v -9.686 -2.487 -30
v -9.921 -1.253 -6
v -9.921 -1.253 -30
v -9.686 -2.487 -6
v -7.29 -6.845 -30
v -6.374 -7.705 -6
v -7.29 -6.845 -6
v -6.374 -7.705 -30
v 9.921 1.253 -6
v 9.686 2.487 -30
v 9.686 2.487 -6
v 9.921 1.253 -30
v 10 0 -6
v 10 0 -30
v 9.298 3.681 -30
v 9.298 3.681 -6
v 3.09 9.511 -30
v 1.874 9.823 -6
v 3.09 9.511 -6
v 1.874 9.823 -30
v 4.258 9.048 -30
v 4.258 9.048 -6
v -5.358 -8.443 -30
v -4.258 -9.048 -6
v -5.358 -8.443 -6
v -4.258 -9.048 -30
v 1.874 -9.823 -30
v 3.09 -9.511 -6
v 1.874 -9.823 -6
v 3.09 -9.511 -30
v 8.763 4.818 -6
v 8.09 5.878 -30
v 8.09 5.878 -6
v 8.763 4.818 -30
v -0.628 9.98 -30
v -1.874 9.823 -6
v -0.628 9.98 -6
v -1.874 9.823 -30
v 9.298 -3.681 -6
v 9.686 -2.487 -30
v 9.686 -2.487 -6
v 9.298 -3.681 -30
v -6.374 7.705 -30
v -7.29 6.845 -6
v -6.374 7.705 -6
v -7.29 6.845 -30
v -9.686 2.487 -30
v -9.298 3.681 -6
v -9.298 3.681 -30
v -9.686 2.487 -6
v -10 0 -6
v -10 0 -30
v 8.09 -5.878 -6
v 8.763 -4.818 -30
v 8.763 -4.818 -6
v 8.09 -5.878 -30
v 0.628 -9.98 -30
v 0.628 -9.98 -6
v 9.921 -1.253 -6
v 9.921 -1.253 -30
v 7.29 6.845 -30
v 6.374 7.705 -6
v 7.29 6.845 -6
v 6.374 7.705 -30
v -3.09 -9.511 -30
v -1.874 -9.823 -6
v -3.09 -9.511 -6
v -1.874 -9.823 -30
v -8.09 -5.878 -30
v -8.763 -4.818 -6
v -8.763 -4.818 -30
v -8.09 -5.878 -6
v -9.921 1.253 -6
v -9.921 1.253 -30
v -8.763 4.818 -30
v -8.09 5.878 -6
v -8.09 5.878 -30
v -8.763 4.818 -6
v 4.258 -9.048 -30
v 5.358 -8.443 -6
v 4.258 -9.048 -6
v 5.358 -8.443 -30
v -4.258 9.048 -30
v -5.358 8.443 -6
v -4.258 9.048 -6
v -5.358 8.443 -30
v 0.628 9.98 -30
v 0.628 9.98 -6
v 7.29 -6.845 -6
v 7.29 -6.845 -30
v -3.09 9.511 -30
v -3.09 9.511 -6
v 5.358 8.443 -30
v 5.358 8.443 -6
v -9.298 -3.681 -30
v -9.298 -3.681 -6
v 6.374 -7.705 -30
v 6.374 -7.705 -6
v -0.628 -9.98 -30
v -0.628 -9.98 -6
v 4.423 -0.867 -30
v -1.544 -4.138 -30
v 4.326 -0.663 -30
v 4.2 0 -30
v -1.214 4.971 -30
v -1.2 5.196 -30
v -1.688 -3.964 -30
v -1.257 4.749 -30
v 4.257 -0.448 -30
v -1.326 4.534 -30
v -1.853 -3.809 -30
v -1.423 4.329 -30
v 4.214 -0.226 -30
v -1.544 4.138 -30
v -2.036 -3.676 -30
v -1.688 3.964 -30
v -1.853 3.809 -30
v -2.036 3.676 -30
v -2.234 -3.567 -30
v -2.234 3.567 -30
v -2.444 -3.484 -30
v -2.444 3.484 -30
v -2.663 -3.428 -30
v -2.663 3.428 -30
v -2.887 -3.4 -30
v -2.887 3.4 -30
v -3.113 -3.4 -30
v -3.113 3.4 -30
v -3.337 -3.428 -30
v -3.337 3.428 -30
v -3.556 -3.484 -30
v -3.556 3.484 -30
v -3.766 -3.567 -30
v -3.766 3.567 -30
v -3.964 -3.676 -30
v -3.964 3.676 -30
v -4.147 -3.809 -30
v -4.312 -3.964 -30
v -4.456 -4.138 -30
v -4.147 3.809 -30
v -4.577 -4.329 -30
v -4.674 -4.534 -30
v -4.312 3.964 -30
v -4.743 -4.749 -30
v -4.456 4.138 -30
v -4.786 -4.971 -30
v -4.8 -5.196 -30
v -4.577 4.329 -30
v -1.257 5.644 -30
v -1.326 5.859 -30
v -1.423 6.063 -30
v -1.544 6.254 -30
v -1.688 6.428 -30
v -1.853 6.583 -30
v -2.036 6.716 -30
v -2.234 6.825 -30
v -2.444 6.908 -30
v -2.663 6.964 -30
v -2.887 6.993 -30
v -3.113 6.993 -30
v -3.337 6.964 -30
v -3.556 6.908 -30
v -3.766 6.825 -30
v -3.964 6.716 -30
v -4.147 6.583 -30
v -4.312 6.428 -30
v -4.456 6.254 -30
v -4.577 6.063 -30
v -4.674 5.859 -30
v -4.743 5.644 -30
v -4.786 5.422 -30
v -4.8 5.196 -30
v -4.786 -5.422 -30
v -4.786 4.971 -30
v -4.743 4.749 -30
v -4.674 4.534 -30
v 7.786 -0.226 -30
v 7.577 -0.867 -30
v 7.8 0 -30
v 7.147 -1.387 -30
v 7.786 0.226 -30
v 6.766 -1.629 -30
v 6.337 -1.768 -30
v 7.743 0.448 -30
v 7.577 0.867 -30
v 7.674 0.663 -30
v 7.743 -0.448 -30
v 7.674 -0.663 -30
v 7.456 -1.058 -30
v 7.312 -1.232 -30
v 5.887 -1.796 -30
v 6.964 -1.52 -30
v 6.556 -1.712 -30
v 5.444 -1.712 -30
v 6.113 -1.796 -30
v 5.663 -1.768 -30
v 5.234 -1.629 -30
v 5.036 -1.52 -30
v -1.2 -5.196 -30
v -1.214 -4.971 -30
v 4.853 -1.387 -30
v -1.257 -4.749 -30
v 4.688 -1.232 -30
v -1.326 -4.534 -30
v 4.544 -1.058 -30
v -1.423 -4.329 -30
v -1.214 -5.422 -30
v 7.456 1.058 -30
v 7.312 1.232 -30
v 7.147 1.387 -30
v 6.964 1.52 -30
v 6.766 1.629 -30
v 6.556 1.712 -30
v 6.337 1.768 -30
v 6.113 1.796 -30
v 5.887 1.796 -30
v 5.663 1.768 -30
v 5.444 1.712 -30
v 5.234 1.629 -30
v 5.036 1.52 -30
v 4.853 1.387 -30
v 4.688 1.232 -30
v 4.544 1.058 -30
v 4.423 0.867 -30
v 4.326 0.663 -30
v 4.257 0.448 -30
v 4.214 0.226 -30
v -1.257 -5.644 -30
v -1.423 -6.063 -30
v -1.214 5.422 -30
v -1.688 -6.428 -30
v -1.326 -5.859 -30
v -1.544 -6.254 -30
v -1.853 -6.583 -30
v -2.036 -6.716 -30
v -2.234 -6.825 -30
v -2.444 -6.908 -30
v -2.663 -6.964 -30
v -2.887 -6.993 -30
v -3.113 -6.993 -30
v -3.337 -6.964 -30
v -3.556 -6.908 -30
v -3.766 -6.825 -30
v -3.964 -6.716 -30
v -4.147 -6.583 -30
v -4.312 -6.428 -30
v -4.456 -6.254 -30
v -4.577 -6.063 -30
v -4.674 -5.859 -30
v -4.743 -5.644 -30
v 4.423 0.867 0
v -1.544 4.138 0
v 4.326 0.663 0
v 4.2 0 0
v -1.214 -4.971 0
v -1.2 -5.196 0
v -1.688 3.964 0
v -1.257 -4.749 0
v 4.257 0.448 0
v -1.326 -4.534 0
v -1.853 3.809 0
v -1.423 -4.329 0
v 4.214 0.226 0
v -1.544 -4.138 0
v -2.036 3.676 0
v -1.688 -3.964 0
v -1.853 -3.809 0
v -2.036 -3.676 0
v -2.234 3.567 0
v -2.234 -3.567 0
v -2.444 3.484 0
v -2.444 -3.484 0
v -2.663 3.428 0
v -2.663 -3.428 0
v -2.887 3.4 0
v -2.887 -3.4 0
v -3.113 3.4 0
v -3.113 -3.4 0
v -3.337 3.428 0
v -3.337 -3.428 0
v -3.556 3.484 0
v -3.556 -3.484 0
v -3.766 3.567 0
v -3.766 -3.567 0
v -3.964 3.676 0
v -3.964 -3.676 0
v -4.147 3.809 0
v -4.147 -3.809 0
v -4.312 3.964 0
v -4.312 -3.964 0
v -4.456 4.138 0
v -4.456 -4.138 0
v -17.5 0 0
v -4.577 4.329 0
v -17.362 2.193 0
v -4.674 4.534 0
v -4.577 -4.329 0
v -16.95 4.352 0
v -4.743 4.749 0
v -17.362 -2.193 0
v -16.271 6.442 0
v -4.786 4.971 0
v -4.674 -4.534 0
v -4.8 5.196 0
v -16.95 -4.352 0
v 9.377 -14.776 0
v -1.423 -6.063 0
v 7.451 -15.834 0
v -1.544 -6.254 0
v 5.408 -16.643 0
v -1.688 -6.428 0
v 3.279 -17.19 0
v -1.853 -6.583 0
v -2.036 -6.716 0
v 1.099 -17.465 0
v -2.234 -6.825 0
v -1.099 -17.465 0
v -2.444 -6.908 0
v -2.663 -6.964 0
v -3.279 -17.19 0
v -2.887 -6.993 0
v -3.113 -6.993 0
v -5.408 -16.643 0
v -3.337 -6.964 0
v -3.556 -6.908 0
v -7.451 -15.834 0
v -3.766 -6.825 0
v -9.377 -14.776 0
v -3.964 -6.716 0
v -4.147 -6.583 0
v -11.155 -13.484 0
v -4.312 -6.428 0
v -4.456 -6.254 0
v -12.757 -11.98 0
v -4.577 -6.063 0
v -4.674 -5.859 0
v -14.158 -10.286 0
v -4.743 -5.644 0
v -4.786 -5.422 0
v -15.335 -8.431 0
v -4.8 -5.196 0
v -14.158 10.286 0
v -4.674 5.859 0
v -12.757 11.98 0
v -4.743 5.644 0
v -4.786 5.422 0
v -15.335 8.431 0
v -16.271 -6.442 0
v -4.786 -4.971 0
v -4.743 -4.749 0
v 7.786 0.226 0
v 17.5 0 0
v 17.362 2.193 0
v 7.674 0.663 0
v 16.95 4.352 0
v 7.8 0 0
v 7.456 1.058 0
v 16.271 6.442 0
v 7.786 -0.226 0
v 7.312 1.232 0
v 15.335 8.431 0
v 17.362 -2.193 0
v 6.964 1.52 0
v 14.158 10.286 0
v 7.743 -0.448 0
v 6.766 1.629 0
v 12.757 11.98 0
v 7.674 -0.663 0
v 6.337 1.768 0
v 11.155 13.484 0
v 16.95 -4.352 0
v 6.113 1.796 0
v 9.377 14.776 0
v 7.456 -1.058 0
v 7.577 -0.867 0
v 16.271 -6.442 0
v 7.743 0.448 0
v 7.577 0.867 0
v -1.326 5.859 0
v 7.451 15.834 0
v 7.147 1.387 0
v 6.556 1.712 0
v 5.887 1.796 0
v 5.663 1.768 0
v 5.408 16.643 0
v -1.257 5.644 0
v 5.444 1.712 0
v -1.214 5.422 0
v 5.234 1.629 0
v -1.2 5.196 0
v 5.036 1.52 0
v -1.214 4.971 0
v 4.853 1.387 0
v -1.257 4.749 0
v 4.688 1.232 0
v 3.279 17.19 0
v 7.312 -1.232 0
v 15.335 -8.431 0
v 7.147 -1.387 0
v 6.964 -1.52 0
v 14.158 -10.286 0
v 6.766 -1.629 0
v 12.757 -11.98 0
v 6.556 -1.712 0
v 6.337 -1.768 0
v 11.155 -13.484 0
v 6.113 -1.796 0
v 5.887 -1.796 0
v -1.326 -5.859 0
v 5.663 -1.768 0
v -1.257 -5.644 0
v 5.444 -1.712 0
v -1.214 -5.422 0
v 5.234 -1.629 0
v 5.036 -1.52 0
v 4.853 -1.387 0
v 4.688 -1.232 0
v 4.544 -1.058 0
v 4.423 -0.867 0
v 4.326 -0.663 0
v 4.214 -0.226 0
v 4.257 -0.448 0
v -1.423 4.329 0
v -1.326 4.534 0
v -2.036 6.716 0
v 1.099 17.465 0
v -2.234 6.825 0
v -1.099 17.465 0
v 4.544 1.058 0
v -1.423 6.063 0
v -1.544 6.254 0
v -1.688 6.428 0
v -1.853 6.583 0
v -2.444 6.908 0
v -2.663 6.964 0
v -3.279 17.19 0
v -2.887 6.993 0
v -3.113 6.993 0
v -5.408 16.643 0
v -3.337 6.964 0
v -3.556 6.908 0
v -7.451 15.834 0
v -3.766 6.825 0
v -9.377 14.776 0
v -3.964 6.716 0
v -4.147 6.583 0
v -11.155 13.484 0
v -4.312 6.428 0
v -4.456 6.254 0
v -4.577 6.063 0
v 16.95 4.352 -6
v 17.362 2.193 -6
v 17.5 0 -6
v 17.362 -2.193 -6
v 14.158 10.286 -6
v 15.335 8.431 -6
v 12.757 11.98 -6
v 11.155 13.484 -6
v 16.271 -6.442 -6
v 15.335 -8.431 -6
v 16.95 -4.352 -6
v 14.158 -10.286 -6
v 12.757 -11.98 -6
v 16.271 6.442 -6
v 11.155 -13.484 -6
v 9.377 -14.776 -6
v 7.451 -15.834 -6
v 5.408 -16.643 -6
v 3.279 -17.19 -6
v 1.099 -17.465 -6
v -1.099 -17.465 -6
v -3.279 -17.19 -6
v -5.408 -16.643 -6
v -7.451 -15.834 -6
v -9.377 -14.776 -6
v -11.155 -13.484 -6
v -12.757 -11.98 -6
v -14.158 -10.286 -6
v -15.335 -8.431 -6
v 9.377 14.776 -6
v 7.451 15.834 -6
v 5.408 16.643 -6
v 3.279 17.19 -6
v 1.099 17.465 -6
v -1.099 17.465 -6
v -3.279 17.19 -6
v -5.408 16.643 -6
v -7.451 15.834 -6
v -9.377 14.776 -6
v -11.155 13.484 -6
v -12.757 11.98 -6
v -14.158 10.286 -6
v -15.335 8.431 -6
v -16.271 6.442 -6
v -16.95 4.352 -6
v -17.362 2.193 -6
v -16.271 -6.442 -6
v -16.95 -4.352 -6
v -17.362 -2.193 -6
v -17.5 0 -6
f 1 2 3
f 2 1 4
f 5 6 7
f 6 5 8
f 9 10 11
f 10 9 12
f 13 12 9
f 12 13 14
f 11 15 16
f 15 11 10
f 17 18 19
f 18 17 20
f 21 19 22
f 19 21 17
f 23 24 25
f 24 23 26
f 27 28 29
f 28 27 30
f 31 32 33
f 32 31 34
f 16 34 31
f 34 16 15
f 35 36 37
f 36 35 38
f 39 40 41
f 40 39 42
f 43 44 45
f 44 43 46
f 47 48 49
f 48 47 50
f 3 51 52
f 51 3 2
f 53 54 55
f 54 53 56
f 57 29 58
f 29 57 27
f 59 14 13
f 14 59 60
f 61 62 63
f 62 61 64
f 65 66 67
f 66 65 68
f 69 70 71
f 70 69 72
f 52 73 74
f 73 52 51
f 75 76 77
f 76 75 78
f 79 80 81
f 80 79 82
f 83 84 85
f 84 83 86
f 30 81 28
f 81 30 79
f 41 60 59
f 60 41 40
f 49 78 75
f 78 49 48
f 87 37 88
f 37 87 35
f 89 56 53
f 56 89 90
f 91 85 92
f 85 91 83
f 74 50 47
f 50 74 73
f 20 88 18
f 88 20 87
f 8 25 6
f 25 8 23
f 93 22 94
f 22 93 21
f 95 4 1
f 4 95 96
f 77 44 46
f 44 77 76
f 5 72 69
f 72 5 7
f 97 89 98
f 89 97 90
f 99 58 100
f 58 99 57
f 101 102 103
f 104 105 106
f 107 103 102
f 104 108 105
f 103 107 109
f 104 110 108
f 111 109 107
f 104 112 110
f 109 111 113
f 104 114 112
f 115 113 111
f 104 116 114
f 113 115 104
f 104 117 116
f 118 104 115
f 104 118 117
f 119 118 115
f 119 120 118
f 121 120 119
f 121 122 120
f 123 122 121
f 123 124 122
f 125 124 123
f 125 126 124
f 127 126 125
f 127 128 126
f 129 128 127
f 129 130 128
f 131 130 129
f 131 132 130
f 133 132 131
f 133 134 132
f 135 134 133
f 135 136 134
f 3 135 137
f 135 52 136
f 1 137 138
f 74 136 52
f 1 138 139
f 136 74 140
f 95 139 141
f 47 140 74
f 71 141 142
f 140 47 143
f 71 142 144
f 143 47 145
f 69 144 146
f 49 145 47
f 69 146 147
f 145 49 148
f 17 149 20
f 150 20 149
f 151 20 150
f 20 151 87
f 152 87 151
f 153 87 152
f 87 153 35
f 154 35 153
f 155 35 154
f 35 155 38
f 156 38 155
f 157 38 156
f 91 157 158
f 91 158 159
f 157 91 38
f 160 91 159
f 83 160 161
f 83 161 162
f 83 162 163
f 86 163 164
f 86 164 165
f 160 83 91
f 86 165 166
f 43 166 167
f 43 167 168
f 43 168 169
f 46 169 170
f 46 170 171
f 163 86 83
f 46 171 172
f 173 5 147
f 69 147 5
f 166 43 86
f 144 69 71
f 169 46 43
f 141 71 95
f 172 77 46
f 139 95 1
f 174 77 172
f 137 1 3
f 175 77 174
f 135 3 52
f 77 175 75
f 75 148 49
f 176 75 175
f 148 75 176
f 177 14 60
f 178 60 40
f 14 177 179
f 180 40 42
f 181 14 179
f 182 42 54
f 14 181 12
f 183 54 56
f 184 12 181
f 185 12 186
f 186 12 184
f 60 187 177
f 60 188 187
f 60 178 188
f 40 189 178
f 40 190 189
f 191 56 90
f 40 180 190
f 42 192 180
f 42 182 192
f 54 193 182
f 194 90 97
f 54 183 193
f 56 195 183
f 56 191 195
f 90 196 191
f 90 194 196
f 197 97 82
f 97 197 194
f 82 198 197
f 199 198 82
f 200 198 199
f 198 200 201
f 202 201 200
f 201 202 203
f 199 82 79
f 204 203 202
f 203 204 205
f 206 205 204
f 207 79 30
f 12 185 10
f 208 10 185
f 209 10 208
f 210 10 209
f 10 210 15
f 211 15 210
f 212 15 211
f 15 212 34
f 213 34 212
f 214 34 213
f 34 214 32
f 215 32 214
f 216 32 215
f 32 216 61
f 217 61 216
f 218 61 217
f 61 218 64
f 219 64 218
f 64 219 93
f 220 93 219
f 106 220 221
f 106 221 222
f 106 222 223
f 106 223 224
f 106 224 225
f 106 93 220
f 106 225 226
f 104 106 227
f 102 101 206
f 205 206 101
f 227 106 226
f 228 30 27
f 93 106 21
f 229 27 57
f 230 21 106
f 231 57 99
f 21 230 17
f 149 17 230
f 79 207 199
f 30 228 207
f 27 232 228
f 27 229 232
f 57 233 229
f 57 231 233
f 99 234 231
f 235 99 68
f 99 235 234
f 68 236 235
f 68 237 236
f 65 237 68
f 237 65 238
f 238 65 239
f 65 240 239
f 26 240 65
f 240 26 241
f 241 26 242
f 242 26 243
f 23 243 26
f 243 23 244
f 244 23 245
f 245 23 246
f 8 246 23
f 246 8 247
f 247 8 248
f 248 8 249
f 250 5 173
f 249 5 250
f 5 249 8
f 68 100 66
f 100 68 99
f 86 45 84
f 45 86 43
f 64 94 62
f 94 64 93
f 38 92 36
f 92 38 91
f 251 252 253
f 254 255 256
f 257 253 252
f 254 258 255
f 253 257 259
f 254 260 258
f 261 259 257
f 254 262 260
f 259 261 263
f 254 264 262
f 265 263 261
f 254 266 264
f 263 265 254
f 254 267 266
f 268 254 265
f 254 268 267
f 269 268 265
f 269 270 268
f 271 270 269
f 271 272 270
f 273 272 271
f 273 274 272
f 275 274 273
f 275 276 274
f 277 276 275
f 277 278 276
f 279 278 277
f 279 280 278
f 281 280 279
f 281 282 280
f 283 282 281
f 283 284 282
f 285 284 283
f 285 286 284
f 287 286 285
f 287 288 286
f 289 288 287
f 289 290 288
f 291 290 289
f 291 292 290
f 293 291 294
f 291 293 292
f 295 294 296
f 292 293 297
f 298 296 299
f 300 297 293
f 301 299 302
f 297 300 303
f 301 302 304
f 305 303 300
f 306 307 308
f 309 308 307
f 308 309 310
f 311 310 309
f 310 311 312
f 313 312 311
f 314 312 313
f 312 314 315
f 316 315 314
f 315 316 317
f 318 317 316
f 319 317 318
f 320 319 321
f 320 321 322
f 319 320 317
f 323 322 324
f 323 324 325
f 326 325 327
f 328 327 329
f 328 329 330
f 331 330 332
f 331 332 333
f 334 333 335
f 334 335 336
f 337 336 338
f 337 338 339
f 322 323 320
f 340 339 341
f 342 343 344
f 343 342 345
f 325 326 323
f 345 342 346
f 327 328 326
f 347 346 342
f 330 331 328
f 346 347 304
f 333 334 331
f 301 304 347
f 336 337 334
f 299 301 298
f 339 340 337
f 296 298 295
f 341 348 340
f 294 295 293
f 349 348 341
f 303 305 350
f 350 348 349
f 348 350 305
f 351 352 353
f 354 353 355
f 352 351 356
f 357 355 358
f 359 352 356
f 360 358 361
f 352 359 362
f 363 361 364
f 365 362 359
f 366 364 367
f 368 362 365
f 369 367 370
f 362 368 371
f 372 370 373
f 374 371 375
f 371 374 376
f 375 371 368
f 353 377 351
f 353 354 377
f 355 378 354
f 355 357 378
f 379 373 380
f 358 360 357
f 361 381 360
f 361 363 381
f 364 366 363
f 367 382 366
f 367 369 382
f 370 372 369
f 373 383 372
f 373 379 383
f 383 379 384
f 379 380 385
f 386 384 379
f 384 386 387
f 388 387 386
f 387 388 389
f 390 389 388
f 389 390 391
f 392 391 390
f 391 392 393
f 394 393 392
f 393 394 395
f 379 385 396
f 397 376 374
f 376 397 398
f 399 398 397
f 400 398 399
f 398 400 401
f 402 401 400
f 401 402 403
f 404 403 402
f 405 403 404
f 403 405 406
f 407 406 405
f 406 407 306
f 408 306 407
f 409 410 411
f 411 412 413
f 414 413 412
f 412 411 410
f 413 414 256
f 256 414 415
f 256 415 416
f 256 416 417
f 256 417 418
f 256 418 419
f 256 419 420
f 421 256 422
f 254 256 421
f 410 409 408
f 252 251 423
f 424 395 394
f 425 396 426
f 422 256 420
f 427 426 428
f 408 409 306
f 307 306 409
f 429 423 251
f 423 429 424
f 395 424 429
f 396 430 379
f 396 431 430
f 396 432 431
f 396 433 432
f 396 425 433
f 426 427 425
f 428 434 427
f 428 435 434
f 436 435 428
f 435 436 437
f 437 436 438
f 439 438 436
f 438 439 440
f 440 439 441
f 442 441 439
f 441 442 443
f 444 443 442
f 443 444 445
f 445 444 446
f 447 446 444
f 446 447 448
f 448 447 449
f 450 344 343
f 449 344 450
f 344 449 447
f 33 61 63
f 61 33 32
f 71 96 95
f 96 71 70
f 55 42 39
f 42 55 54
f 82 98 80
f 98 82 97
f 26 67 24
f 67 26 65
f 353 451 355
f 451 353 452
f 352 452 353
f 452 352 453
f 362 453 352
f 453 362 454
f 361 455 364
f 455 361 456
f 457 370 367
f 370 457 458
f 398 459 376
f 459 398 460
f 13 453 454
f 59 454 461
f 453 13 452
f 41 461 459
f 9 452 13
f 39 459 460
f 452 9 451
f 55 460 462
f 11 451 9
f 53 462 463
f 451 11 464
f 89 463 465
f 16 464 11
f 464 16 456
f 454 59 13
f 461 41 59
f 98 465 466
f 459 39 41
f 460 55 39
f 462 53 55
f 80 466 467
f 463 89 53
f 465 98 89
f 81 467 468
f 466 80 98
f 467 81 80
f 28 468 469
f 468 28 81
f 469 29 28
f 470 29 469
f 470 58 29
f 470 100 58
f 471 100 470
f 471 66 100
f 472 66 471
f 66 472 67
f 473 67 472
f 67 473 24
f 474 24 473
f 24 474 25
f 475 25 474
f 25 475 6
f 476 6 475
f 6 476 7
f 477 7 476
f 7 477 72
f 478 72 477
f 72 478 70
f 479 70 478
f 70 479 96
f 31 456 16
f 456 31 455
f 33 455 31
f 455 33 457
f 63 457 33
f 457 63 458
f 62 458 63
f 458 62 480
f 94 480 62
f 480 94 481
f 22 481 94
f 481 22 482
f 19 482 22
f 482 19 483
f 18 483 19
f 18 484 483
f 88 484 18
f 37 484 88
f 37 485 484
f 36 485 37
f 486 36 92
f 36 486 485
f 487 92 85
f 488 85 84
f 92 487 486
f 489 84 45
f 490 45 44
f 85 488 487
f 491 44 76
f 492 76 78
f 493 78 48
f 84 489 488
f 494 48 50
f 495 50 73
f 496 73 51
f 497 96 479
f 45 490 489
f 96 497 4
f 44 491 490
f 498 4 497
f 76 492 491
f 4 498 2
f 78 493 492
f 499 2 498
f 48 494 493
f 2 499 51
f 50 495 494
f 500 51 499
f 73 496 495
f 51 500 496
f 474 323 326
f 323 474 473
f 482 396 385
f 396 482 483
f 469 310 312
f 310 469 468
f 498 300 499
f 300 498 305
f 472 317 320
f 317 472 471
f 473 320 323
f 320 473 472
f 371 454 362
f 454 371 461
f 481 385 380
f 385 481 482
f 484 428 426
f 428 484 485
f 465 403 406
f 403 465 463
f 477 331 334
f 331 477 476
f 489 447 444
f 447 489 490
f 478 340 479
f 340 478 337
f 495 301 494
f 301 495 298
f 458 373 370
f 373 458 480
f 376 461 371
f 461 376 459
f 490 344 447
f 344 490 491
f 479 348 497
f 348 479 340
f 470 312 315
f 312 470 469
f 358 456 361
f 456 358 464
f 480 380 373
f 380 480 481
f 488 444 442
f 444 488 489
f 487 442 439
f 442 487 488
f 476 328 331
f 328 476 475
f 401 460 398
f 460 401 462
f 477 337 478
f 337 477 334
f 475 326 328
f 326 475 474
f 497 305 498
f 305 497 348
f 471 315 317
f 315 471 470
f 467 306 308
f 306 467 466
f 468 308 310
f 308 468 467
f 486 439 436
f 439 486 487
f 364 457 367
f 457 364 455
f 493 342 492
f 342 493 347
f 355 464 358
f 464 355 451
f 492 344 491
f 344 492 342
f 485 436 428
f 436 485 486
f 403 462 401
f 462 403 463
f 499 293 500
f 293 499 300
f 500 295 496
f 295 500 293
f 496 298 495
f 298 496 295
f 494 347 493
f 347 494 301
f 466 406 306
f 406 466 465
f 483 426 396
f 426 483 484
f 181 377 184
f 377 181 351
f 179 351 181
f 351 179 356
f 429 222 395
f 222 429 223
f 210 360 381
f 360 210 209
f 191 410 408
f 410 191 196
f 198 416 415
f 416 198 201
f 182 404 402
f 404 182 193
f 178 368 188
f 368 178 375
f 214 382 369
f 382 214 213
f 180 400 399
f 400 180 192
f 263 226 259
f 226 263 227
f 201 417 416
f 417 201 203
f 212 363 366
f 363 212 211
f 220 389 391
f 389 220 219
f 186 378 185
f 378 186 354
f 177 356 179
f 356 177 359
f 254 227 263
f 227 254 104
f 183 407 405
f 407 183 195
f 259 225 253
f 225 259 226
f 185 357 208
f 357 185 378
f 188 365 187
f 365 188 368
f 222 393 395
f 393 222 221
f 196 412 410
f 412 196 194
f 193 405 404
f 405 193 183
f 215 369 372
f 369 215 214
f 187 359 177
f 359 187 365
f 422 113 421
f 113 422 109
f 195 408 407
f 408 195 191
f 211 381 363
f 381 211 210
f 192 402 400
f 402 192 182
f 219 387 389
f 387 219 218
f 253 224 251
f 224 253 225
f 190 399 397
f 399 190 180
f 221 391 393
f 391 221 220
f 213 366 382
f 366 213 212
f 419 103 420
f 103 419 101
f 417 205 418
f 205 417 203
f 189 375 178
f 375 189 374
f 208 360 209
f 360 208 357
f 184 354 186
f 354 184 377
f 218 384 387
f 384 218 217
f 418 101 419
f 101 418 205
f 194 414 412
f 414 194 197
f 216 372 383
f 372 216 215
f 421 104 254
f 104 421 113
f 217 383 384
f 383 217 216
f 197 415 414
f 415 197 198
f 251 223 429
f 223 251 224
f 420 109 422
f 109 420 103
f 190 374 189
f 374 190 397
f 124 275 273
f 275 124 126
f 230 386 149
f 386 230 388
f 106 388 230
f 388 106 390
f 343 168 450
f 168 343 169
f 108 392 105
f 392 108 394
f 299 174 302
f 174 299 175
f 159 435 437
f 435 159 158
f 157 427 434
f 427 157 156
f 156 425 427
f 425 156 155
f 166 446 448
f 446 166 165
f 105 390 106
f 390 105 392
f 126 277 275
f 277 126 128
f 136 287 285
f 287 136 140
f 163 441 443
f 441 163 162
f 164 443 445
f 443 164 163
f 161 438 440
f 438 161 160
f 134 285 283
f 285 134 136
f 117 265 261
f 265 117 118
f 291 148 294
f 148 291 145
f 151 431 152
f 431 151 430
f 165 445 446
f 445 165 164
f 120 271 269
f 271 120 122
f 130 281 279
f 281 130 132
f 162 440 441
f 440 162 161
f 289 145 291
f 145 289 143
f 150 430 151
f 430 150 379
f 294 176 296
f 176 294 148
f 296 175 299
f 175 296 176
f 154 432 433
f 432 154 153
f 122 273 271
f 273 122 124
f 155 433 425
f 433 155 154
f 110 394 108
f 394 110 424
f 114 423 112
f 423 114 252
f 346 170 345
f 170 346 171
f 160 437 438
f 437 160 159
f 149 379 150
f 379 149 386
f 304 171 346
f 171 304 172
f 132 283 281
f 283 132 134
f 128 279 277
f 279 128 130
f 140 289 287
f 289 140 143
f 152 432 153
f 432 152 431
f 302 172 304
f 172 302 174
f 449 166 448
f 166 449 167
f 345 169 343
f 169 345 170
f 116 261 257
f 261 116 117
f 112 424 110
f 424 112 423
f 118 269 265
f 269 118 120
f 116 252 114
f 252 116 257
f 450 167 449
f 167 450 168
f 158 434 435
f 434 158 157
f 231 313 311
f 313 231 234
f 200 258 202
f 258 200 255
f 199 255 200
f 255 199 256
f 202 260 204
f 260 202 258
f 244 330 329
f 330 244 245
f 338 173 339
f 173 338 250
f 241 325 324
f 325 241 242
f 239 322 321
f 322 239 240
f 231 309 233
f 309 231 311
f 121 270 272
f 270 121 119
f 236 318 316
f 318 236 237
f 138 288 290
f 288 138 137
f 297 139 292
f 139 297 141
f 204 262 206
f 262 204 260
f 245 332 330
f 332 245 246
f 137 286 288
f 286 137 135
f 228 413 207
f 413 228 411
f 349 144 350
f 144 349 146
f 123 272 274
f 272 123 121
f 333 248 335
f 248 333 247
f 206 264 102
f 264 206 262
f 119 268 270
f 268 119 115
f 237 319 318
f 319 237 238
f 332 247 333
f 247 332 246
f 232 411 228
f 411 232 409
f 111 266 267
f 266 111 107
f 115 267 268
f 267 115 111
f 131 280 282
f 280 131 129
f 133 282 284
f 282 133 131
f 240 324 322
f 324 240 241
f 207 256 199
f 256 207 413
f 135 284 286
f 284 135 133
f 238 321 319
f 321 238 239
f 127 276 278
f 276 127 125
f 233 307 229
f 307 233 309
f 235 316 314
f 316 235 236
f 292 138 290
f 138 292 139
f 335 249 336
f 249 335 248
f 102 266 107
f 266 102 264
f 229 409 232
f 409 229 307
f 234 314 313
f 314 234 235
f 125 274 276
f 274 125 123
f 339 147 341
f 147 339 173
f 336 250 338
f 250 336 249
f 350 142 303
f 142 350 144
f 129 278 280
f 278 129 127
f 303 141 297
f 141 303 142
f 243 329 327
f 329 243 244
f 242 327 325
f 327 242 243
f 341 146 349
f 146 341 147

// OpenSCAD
$fn = 50;


difference() {
	union() {
		translate(v = [0, 0, -30.0000000000]) {
			cylinder(h = 30, r = 10.0000000000);
		}
		translate(v = [0, 0, -6.0000000000]) {
			cylinder(h = 6, r = 17.5000000000);
		}
	}
	union() {
		#translate(v = [6.0000000000, 0.0000000000, -30]) {
			cylinder(h = 30, r = 1.8000000000);
		}
		#translate(v = [-3.0000000000, 5.1961524227, -30]) {
			cylinder(h = 30, r = 1.8000000000);
		}
		#translate(v = [-3.0000000000, -5.1961524227, -30]) {
			cylinder(h = 30, r = 1.8000000000);
		}
	}
}
